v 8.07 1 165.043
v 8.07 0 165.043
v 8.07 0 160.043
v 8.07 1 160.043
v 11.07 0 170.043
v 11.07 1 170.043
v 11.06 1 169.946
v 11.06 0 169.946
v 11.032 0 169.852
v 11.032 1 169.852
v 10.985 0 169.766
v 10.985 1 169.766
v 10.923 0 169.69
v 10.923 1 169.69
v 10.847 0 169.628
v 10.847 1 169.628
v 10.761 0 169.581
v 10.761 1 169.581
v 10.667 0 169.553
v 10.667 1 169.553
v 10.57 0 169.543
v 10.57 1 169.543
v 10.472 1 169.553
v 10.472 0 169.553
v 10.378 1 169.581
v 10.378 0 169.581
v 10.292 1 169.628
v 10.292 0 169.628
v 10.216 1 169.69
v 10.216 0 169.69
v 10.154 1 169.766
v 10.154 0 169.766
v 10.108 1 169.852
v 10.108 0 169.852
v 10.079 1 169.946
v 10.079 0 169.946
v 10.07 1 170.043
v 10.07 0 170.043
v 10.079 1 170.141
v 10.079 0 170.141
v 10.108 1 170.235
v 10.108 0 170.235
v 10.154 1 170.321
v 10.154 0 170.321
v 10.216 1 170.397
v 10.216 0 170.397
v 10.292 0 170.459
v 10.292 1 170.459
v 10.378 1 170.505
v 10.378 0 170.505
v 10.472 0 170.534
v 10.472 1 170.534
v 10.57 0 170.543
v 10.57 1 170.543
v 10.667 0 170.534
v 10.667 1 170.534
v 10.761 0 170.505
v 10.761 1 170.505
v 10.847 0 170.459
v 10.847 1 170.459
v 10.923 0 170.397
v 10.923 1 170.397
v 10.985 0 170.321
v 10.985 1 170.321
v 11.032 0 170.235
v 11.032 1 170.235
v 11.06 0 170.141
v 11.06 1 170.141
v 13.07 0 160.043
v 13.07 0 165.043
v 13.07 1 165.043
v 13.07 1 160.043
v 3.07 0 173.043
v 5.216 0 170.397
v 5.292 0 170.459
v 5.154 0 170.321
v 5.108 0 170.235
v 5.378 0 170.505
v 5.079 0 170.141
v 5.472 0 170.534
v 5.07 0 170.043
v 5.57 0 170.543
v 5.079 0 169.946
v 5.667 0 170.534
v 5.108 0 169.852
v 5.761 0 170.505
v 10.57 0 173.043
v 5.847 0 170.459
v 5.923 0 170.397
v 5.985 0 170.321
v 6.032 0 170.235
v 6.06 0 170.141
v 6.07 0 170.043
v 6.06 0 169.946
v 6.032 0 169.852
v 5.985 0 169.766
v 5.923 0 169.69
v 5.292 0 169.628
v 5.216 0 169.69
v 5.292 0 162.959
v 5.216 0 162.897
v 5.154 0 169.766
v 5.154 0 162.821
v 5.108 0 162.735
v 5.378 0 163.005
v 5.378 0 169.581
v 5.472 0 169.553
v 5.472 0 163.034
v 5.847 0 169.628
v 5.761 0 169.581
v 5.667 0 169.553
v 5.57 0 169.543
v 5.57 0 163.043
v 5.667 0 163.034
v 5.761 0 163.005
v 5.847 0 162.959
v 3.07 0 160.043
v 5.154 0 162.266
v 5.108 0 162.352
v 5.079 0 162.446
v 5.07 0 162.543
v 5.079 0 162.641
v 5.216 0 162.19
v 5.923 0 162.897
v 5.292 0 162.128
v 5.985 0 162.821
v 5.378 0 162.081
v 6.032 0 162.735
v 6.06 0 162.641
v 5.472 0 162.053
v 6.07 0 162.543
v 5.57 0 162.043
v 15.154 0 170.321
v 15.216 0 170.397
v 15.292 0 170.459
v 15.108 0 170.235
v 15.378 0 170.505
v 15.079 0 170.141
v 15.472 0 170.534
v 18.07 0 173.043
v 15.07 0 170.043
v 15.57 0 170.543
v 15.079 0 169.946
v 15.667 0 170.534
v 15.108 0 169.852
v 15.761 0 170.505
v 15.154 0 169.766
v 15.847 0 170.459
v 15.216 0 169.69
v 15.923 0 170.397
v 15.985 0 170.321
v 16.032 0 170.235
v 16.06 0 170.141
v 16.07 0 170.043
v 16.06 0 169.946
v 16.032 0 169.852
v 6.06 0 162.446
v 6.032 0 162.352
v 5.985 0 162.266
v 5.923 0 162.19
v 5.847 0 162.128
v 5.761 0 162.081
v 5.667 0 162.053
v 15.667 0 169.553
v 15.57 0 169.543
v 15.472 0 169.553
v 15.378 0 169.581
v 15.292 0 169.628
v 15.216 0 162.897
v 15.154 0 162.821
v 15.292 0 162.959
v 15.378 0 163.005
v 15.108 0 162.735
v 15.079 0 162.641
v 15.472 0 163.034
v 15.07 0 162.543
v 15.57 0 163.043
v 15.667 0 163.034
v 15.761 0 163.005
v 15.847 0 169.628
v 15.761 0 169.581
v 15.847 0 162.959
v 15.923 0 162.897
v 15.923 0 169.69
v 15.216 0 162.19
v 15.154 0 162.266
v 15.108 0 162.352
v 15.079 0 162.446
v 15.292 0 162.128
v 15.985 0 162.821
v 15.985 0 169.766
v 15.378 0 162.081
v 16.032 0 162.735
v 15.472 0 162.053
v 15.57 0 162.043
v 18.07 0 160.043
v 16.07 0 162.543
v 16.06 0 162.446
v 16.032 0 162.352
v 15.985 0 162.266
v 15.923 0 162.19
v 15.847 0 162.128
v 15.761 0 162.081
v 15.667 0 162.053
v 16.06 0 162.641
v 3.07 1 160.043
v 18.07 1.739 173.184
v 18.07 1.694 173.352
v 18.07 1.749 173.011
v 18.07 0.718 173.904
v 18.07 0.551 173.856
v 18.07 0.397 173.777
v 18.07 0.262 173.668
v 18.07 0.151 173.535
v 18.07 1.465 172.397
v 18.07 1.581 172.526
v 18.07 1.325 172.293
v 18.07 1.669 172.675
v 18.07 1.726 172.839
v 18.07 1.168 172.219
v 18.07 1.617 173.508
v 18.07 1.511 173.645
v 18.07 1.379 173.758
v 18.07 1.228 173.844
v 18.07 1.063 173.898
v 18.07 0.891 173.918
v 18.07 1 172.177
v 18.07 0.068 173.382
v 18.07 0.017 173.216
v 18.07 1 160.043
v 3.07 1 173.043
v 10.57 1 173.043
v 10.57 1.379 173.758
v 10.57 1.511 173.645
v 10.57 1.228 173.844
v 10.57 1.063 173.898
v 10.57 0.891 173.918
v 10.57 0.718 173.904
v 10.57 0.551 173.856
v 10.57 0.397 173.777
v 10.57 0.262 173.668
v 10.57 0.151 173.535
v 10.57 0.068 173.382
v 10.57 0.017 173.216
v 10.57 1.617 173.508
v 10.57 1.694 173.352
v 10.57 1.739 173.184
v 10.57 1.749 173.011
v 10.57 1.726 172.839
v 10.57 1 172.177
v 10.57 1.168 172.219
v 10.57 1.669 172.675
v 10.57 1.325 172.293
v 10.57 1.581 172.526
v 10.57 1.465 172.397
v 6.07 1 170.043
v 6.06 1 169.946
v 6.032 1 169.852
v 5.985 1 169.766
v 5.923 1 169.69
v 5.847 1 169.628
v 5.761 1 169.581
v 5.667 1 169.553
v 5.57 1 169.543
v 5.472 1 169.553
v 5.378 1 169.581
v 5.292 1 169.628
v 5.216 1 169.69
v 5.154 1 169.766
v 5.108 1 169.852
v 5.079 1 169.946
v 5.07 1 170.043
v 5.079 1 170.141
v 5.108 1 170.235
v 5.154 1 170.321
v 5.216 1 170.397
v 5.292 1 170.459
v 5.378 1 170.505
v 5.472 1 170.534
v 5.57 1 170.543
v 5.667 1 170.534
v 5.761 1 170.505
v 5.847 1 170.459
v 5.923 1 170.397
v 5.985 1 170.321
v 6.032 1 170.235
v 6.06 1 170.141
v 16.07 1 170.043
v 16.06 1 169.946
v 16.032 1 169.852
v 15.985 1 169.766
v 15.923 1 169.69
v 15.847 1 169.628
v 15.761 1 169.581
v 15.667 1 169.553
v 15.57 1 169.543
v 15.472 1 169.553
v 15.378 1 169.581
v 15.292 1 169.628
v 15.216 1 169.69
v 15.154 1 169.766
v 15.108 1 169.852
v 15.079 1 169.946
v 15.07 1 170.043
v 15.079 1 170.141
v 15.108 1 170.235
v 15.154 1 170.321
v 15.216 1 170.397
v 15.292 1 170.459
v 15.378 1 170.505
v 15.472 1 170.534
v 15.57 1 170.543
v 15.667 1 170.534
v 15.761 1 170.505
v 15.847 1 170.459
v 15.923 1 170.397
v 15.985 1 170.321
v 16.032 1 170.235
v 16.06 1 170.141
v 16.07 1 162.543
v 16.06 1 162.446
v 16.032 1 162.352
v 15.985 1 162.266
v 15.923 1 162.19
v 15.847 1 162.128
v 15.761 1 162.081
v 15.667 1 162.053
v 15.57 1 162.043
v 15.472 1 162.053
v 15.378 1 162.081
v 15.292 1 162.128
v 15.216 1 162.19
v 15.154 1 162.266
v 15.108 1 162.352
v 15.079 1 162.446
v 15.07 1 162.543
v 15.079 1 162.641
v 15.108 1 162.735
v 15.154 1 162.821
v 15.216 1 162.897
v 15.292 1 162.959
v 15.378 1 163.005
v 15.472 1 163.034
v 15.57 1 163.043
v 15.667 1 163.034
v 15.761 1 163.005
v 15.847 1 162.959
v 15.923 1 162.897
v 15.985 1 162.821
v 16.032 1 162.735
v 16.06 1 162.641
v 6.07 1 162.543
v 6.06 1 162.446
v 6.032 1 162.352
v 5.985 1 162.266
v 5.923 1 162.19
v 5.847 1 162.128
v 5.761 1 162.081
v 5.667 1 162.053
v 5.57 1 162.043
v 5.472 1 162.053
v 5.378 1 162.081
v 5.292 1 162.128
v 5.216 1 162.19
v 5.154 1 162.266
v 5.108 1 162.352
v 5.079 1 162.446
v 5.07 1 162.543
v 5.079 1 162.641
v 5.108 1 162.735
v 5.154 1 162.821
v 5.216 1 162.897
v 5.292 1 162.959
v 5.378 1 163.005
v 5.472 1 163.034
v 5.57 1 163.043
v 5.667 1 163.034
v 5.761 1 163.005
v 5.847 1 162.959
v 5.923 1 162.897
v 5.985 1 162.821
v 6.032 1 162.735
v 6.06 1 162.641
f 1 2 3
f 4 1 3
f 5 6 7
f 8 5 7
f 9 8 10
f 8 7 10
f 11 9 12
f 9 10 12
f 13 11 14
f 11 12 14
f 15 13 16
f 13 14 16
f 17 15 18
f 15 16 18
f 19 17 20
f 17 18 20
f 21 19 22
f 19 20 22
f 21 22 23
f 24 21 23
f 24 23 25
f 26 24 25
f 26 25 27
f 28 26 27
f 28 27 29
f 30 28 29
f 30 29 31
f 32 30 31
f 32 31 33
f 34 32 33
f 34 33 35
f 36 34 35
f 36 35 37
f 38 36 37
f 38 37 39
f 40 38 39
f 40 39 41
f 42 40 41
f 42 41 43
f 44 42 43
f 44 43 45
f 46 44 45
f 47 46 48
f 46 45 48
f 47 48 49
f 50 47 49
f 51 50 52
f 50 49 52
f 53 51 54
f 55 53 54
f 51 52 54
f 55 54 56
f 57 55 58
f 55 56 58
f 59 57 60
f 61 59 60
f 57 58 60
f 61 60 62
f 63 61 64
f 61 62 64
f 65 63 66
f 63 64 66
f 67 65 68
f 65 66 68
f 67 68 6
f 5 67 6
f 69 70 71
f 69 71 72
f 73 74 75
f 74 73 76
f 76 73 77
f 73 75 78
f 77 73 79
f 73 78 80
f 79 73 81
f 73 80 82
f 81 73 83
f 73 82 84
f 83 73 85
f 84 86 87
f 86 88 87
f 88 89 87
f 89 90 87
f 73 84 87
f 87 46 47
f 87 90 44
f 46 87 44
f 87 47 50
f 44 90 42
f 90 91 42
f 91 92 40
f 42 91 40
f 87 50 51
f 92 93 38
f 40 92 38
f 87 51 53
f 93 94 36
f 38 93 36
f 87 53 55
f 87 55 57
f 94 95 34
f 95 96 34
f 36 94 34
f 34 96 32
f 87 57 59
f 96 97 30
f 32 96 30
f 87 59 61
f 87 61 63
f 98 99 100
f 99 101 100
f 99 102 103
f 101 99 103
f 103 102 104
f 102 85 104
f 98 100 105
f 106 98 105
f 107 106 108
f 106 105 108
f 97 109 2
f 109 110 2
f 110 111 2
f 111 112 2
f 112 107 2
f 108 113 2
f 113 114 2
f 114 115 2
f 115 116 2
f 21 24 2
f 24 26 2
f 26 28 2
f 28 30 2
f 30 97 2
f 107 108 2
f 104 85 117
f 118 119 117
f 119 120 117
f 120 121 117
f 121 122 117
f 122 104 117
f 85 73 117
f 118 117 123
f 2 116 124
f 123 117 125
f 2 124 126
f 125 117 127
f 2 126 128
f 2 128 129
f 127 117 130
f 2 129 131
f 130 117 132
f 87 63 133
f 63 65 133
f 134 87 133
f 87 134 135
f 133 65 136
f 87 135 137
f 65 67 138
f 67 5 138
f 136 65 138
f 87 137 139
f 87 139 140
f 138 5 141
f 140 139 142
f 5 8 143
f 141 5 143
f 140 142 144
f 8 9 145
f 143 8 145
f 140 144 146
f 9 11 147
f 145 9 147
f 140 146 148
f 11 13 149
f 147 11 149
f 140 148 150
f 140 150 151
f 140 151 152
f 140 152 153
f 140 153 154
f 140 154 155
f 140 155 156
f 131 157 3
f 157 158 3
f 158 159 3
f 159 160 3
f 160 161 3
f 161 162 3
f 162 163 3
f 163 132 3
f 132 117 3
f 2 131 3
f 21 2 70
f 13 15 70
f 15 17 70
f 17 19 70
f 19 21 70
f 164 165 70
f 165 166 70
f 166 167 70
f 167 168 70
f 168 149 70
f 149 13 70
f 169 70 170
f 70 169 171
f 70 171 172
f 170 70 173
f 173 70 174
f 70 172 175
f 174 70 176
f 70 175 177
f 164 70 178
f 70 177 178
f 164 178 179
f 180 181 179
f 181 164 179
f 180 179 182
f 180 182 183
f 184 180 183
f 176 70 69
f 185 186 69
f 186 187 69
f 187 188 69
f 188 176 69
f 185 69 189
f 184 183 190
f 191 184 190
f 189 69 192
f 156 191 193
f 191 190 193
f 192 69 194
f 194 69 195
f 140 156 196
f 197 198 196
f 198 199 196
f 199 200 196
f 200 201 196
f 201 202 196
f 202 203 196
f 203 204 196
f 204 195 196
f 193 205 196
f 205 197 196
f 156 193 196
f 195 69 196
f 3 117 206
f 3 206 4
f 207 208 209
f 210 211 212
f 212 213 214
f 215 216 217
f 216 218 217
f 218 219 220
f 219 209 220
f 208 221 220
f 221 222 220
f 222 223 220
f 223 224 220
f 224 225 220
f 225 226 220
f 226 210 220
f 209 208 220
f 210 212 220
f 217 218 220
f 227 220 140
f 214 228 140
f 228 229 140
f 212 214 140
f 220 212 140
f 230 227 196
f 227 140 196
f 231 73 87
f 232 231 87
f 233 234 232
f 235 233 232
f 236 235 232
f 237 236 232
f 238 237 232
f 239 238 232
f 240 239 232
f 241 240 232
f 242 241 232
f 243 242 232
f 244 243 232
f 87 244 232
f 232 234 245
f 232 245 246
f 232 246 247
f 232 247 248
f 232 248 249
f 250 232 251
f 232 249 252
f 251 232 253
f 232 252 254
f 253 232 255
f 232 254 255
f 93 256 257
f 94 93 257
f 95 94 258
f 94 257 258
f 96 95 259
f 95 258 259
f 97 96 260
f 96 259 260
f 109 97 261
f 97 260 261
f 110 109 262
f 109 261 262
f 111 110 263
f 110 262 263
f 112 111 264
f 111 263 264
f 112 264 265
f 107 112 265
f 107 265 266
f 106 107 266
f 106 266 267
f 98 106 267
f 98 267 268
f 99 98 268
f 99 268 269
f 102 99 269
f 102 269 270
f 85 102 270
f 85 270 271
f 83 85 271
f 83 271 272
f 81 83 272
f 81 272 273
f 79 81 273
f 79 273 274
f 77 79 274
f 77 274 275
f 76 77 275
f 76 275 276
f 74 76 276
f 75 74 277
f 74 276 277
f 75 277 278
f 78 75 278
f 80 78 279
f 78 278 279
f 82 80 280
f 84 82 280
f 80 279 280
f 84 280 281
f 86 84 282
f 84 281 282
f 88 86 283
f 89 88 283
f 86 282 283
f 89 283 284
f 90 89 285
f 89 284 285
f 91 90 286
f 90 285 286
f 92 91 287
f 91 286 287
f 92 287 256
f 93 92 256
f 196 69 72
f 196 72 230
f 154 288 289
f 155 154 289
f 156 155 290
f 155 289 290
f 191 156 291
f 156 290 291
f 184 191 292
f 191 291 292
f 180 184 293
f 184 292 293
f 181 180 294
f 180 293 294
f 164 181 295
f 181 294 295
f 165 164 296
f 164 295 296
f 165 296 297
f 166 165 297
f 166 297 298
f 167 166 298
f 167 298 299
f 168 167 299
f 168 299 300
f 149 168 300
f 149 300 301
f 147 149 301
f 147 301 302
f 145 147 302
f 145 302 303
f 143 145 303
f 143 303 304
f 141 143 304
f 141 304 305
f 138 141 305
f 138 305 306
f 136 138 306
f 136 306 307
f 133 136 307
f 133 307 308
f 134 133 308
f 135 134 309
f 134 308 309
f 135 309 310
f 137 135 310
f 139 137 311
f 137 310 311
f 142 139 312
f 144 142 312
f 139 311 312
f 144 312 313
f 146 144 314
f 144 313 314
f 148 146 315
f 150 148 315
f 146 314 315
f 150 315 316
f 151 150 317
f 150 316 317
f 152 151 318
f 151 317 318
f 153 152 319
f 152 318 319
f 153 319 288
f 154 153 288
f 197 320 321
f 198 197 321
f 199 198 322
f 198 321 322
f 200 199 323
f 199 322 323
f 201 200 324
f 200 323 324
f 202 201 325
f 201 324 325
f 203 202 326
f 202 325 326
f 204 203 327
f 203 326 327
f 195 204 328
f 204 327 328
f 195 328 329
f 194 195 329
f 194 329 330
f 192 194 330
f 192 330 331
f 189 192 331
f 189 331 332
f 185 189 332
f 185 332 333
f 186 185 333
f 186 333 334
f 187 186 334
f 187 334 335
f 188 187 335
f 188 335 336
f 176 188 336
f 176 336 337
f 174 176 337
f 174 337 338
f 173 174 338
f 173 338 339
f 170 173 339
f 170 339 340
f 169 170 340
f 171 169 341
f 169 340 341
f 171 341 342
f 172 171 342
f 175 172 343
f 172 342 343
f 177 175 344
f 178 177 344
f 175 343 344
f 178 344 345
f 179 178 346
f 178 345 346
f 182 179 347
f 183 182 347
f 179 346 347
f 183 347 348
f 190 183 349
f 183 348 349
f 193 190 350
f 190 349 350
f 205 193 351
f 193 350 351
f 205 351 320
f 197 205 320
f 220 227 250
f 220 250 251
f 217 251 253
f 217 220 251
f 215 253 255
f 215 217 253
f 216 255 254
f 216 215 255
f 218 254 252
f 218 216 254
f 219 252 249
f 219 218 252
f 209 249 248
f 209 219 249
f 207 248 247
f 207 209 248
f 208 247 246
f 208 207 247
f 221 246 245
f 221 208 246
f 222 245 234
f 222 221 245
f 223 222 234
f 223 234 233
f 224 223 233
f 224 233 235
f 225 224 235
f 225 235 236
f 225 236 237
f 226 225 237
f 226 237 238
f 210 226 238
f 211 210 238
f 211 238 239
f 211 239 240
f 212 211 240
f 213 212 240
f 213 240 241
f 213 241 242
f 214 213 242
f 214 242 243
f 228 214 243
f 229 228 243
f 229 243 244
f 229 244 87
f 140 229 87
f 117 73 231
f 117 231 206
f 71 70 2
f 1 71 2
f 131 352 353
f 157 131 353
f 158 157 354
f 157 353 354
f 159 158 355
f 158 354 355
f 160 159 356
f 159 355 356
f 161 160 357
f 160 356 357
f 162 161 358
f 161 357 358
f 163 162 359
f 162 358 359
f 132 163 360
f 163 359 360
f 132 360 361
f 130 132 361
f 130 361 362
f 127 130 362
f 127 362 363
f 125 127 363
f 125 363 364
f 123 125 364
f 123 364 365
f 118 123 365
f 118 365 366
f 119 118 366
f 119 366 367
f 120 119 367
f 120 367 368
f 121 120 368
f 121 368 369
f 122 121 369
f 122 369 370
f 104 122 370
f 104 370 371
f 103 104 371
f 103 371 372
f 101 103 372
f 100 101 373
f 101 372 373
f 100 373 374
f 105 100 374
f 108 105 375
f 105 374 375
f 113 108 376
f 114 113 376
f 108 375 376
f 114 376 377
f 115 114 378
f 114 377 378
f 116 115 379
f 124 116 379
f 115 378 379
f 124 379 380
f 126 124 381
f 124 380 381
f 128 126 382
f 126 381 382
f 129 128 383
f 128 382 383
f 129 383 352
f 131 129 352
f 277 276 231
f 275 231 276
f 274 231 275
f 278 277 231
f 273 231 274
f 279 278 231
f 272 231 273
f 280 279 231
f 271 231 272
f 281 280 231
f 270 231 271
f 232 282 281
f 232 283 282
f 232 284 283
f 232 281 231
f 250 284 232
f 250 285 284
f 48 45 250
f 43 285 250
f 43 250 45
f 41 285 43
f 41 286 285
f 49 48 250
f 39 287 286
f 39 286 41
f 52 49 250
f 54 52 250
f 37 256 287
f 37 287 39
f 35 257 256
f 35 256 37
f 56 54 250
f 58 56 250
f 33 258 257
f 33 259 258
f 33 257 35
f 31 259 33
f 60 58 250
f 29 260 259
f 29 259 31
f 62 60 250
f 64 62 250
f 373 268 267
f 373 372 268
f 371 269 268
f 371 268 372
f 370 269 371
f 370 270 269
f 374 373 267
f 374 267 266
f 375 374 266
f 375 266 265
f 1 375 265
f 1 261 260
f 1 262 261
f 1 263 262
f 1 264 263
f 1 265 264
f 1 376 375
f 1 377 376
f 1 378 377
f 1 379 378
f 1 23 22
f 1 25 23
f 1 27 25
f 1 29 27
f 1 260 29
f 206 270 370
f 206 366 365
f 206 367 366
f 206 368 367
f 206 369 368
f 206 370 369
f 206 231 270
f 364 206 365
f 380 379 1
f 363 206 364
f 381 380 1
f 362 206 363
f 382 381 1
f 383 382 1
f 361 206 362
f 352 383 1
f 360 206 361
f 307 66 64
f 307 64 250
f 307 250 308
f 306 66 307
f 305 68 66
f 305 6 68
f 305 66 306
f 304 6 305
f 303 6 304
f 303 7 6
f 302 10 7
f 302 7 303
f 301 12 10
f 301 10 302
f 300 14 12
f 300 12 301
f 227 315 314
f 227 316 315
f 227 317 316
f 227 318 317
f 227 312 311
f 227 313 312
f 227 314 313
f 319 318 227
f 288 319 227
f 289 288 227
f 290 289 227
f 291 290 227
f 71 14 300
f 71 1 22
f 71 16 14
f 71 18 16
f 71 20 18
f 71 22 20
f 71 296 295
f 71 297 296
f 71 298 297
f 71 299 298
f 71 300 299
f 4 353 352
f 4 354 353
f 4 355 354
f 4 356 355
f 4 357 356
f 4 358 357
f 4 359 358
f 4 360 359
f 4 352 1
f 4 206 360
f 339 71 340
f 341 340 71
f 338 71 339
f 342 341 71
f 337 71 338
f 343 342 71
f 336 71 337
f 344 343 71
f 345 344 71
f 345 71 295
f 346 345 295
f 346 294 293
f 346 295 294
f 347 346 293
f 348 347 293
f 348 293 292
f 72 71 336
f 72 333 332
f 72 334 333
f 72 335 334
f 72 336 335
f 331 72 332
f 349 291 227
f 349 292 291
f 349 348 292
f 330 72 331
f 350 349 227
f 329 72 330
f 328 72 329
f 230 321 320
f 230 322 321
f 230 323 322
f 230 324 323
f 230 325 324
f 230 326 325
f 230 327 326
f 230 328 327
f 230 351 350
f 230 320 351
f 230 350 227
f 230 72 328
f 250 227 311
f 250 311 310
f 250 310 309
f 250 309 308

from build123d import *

# Parameters (mm, degrees)
SKETCH1_W           = 15
SKETCH1_H           = 13
BOSS_EXTRUDE1_DEPTH = 1
SKETCH2_R           = 0.875
BOSS_EXTRUDE2_DEPTH = 7.5
SKETCH3_W           = 5
SKETCH3_H           = 5
CUT_EXTRUDE1_DEPTH  = 10
SKETCH4_R           = 0.5
CUT_EXTRUDE2_DEPTH  = 2


with BuildPart() as part:
    # Sketch1 → Boss-Extrude1 (new body)
    with BuildSketch(Plane(origin=(0, 0, 0), x_dir=(1, 0, 0), z_dir=(0, 1, 0))):
        with Locations((10.569631841, -166.54341444)):
            Rectangle(SKETCH1_W, SKETCH1_H)
    extrude(amount=BOSS_EXTRUDE1_DEPTH)

    # Sketch2 → Boss-Extrude2 (add)
    with BuildSketch(Plane(origin=(18.069631841, 0, 0), x_dir=(0, 0, -1), z_dir=(1, 0, 0))):
        with Locations((-173.04341444, 0.875)):
            Circle(SKETCH2_R)
    extrude(amount=-BOSS_EXTRUDE2_DEPTH)

    # Sketch3 → Cut-Extrude1 (cut)
    with BuildSketch(Plane(origin=(0, 0, 0), x_dir=(-1, 0, 0), z_dir=(0, -1, 0))):
        with Locations((-10.569631841, -162.54341444)):
            Rectangle(SKETCH3_W, SKETCH3_H)
    extrude(amount=-CUT_EXTRUDE1_DEPTH, mode=Mode.SUBTRACT)

    # Sketch4 → Cut-Extrude2 (cut, through all)
    with BuildSketch(Plane(origin=(0, 1, 0), x_dir=(1, 0, 0), z_dir=(0, 1, 0))):
        with Locations((15.569631841, -162.54341444)):
            Circle(SKETCH4_R)
        with Locations((15.569631841, -170.04341444)):
            Circle(SKETCH4_R)
        with Locations((10.569631841, -170.04341444)):
            Circle(SKETCH4_R)
        with Locations((5.569631841, -170.04341444)):
            Circle(SKETCH4_R)
        with Locations((5.569631841, -162.54341444)):
            Circle(SKETCH4_R)
    extrude(amount=-CUT_EXTRUDE2_DEPTH, mode=Mode.SUBTRACT)


solid = part.part
